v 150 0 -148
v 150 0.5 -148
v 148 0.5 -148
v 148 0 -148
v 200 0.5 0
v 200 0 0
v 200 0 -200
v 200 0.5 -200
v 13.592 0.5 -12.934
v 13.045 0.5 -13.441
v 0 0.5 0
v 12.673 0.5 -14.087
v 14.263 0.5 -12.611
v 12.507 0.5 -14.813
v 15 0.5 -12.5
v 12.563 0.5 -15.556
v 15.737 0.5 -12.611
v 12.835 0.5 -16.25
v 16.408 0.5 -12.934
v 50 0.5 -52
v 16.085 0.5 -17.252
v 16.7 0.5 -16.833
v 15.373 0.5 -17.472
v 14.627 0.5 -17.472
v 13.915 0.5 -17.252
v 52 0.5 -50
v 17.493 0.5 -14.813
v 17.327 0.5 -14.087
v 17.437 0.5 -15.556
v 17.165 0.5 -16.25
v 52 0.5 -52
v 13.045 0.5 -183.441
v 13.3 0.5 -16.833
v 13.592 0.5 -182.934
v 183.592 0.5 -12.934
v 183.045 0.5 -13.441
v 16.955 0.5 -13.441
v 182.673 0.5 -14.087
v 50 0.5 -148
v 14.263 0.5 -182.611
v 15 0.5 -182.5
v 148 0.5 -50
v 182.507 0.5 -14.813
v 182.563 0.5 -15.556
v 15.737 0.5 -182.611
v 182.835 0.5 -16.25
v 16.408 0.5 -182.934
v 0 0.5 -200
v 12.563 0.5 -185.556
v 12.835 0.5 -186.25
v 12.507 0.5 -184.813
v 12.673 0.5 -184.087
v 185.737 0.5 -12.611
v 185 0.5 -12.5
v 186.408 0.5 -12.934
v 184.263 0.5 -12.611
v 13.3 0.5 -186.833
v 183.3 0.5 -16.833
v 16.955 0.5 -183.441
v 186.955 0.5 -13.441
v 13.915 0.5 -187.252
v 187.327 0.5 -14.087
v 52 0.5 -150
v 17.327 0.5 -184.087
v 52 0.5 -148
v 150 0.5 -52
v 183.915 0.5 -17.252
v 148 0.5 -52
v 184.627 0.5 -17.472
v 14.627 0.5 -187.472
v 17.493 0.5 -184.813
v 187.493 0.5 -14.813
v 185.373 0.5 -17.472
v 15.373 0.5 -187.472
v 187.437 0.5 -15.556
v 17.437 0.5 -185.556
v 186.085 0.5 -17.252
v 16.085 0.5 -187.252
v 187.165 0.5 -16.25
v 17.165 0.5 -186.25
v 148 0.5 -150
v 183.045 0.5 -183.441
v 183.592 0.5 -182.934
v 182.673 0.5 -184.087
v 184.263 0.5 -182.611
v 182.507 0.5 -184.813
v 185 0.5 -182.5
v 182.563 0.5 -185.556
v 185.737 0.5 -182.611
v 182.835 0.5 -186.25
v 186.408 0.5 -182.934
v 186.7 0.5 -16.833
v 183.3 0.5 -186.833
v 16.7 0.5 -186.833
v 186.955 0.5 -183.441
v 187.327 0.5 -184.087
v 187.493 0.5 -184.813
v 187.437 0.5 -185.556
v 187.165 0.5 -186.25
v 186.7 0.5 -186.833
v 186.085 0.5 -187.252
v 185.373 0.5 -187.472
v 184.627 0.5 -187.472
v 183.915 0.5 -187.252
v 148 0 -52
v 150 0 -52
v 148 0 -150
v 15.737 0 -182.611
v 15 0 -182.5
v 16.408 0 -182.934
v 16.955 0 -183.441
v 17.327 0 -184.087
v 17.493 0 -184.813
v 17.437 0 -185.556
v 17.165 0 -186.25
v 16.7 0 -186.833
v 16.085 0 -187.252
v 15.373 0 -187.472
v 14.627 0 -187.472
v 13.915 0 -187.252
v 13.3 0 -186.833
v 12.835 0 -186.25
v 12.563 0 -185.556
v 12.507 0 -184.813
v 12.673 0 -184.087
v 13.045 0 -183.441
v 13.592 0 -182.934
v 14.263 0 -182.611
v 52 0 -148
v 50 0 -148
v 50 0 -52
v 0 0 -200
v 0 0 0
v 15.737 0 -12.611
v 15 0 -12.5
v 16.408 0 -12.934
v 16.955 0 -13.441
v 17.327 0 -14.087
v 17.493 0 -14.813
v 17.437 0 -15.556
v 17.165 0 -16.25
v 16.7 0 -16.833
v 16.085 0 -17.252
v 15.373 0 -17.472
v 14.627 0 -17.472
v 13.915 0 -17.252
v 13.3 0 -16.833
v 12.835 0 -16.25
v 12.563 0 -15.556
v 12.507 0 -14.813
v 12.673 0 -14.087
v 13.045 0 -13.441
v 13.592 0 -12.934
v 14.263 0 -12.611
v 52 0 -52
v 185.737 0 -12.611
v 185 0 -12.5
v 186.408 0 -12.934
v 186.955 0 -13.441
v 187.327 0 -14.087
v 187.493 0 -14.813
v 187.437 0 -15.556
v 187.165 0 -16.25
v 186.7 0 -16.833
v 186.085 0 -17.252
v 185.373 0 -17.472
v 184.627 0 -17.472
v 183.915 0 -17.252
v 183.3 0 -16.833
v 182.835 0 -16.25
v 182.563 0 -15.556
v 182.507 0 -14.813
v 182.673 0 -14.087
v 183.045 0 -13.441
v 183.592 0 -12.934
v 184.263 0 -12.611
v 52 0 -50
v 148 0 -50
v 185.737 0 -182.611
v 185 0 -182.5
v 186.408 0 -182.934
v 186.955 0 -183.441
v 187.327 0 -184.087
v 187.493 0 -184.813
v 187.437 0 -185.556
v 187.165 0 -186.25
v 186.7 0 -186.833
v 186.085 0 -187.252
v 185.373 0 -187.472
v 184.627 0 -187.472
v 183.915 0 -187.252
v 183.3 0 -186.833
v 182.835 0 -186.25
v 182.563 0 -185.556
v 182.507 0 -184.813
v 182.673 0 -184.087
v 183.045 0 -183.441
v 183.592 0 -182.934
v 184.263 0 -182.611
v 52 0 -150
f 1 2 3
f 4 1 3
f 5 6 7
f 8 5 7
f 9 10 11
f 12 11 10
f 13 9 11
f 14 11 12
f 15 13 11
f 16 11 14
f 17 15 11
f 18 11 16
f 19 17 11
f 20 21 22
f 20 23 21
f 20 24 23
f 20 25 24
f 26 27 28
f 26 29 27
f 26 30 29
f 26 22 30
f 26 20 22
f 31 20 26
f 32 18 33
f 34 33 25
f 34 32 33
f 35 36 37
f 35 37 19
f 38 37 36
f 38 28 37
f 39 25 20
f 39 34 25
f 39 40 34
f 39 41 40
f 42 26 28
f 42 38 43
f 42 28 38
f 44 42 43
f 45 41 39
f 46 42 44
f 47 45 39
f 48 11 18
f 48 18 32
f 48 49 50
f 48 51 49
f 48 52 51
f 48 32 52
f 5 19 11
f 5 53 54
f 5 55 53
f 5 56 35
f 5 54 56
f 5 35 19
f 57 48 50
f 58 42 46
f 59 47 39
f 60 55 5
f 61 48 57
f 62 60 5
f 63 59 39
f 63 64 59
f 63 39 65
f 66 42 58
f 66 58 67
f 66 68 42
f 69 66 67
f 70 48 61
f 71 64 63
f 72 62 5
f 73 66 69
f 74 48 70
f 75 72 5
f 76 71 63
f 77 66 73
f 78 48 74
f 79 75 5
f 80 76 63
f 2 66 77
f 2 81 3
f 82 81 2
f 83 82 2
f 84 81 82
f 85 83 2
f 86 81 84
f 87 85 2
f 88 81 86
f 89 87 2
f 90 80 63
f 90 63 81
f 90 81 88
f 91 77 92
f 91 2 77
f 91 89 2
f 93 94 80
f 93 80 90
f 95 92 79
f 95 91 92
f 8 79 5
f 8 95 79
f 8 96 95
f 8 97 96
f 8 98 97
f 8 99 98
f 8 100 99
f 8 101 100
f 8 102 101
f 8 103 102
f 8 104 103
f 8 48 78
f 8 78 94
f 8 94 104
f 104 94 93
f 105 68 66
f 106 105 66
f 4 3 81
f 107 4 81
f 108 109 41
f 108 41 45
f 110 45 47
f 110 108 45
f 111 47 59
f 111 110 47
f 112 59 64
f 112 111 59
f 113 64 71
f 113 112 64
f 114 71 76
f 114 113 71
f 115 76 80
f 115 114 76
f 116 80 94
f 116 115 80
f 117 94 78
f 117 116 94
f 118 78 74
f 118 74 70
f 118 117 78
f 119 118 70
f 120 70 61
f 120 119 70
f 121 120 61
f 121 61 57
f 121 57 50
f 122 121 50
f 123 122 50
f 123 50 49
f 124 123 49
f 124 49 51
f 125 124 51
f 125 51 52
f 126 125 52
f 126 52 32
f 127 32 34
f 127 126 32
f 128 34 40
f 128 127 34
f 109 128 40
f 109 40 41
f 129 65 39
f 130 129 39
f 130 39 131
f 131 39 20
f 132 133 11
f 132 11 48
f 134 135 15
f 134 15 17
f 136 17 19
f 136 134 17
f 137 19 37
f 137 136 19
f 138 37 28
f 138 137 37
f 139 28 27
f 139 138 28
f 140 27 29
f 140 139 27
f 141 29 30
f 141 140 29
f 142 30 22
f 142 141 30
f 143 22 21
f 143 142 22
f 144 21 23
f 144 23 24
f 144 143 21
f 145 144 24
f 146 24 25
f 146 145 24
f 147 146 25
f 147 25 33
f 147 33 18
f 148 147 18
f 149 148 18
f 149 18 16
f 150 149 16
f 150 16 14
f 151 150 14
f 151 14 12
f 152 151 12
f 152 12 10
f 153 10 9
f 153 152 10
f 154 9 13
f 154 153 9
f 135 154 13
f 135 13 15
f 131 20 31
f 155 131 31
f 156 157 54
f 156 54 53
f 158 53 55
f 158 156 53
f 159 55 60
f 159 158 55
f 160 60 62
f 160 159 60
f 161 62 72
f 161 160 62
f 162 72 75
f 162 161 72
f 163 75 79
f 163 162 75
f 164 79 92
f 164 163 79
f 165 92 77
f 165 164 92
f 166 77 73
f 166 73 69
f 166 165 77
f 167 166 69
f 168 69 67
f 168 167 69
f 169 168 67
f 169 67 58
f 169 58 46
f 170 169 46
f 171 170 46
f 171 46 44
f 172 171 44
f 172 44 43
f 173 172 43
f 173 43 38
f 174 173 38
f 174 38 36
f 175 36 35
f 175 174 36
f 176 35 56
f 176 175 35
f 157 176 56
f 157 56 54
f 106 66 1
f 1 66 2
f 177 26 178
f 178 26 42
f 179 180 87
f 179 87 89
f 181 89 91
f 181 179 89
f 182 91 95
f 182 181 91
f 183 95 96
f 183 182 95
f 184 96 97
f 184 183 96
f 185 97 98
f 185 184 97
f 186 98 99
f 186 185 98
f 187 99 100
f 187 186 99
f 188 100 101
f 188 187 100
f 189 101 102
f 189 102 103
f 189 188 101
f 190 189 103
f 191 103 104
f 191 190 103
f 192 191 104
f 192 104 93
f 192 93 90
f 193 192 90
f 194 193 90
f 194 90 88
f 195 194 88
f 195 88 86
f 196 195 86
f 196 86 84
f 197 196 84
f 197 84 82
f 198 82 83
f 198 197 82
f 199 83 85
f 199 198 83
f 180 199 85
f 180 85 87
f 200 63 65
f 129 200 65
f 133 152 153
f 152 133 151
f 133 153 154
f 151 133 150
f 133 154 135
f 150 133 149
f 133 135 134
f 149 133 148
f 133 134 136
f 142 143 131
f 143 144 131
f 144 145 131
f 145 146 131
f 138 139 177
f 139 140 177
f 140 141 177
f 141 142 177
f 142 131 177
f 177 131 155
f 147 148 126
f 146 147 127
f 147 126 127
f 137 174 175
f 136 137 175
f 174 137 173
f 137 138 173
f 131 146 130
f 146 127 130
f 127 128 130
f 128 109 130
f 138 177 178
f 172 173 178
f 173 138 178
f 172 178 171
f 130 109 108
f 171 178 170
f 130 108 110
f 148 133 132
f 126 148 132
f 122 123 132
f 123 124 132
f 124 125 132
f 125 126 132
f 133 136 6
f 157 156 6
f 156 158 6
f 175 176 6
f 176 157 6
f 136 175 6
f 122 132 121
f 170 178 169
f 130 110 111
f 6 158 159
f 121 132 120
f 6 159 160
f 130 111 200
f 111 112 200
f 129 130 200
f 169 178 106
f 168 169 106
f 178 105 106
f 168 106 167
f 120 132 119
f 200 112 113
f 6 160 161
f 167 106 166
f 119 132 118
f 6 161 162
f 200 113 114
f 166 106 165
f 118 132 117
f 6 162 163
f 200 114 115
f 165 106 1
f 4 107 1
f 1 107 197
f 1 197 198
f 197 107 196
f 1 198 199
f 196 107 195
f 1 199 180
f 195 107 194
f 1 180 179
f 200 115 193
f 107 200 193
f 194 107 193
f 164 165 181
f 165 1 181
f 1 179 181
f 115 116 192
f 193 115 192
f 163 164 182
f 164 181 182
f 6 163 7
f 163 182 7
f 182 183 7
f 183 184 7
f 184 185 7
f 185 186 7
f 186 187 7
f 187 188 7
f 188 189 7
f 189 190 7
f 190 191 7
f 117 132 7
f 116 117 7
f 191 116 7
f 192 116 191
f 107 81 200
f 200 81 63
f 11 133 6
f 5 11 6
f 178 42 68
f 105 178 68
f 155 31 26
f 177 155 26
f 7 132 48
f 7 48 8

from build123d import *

# Parameters (mm, degrees)
CROQUIS1_W              = 200
CROQUIS1_H              = 200
CROQUIS1_R              = 2.5
SALIENTE_EXTRUIR1_DEPTH = 0.5
CORTAR_EXTRUIR1_DEPTH   = 10


with BuildPart() as part:
    # Croquis1 → Saliente-Extruir1 (new body)
    with BuildSketch(Plane(origin=(0, 0, 0), x_dir=(1, 0, 0), z_dir=(0, 1, 0))):
        with Locations((100, 100)):
            Rectangle(CROQUIS1_W, CROQUIS1_H)
        with Locations(Location((15, 185, 0), (0, 0, 270))):
            Circle(CROQUIS1_R, mode=Mode.SUBTRACT)
        with Locations(Location((185, 185, 0), (0, 0, 270))):
            Circle(CROQUIS1_R, mode=Mode.SUBTRACT)
        with Locations(Location((185, 15, 0), (0, 0, 270))):
            Circle(CROQUIS1_R, mode=Mode.SUBTRACT)
        with Locations(Location((15, 15, 0), (0, 0, 270))):
            Circle(CROQUIS1_R, mode=Mode.SUBTRACT)
    extrude(amount=SALIENTE_EXTRUIR1_DEPTH)

    # Croquis2 → Cortar-Extruir1 (cut)
    with BuildSketch(Plane(origin=(0, 0.5, 0), x_dir=(1, 0, 0), z_dir=(0, 1, 0))):
        Polygon((50, 148), (50, 100), (50, 52), (52, 52), (52, 50), (100, 50), (148, 50), (148, 52), (150, 52), (150, 100), (150, 148), (148, 148), (148, 150), (100, 150), (52, 150), (52, 148), align=None)
    extrude(amount=-CORTAR_EXTRUIR1_DEPTH, mode=Mode.SUBTRACT)


solid = part.part
